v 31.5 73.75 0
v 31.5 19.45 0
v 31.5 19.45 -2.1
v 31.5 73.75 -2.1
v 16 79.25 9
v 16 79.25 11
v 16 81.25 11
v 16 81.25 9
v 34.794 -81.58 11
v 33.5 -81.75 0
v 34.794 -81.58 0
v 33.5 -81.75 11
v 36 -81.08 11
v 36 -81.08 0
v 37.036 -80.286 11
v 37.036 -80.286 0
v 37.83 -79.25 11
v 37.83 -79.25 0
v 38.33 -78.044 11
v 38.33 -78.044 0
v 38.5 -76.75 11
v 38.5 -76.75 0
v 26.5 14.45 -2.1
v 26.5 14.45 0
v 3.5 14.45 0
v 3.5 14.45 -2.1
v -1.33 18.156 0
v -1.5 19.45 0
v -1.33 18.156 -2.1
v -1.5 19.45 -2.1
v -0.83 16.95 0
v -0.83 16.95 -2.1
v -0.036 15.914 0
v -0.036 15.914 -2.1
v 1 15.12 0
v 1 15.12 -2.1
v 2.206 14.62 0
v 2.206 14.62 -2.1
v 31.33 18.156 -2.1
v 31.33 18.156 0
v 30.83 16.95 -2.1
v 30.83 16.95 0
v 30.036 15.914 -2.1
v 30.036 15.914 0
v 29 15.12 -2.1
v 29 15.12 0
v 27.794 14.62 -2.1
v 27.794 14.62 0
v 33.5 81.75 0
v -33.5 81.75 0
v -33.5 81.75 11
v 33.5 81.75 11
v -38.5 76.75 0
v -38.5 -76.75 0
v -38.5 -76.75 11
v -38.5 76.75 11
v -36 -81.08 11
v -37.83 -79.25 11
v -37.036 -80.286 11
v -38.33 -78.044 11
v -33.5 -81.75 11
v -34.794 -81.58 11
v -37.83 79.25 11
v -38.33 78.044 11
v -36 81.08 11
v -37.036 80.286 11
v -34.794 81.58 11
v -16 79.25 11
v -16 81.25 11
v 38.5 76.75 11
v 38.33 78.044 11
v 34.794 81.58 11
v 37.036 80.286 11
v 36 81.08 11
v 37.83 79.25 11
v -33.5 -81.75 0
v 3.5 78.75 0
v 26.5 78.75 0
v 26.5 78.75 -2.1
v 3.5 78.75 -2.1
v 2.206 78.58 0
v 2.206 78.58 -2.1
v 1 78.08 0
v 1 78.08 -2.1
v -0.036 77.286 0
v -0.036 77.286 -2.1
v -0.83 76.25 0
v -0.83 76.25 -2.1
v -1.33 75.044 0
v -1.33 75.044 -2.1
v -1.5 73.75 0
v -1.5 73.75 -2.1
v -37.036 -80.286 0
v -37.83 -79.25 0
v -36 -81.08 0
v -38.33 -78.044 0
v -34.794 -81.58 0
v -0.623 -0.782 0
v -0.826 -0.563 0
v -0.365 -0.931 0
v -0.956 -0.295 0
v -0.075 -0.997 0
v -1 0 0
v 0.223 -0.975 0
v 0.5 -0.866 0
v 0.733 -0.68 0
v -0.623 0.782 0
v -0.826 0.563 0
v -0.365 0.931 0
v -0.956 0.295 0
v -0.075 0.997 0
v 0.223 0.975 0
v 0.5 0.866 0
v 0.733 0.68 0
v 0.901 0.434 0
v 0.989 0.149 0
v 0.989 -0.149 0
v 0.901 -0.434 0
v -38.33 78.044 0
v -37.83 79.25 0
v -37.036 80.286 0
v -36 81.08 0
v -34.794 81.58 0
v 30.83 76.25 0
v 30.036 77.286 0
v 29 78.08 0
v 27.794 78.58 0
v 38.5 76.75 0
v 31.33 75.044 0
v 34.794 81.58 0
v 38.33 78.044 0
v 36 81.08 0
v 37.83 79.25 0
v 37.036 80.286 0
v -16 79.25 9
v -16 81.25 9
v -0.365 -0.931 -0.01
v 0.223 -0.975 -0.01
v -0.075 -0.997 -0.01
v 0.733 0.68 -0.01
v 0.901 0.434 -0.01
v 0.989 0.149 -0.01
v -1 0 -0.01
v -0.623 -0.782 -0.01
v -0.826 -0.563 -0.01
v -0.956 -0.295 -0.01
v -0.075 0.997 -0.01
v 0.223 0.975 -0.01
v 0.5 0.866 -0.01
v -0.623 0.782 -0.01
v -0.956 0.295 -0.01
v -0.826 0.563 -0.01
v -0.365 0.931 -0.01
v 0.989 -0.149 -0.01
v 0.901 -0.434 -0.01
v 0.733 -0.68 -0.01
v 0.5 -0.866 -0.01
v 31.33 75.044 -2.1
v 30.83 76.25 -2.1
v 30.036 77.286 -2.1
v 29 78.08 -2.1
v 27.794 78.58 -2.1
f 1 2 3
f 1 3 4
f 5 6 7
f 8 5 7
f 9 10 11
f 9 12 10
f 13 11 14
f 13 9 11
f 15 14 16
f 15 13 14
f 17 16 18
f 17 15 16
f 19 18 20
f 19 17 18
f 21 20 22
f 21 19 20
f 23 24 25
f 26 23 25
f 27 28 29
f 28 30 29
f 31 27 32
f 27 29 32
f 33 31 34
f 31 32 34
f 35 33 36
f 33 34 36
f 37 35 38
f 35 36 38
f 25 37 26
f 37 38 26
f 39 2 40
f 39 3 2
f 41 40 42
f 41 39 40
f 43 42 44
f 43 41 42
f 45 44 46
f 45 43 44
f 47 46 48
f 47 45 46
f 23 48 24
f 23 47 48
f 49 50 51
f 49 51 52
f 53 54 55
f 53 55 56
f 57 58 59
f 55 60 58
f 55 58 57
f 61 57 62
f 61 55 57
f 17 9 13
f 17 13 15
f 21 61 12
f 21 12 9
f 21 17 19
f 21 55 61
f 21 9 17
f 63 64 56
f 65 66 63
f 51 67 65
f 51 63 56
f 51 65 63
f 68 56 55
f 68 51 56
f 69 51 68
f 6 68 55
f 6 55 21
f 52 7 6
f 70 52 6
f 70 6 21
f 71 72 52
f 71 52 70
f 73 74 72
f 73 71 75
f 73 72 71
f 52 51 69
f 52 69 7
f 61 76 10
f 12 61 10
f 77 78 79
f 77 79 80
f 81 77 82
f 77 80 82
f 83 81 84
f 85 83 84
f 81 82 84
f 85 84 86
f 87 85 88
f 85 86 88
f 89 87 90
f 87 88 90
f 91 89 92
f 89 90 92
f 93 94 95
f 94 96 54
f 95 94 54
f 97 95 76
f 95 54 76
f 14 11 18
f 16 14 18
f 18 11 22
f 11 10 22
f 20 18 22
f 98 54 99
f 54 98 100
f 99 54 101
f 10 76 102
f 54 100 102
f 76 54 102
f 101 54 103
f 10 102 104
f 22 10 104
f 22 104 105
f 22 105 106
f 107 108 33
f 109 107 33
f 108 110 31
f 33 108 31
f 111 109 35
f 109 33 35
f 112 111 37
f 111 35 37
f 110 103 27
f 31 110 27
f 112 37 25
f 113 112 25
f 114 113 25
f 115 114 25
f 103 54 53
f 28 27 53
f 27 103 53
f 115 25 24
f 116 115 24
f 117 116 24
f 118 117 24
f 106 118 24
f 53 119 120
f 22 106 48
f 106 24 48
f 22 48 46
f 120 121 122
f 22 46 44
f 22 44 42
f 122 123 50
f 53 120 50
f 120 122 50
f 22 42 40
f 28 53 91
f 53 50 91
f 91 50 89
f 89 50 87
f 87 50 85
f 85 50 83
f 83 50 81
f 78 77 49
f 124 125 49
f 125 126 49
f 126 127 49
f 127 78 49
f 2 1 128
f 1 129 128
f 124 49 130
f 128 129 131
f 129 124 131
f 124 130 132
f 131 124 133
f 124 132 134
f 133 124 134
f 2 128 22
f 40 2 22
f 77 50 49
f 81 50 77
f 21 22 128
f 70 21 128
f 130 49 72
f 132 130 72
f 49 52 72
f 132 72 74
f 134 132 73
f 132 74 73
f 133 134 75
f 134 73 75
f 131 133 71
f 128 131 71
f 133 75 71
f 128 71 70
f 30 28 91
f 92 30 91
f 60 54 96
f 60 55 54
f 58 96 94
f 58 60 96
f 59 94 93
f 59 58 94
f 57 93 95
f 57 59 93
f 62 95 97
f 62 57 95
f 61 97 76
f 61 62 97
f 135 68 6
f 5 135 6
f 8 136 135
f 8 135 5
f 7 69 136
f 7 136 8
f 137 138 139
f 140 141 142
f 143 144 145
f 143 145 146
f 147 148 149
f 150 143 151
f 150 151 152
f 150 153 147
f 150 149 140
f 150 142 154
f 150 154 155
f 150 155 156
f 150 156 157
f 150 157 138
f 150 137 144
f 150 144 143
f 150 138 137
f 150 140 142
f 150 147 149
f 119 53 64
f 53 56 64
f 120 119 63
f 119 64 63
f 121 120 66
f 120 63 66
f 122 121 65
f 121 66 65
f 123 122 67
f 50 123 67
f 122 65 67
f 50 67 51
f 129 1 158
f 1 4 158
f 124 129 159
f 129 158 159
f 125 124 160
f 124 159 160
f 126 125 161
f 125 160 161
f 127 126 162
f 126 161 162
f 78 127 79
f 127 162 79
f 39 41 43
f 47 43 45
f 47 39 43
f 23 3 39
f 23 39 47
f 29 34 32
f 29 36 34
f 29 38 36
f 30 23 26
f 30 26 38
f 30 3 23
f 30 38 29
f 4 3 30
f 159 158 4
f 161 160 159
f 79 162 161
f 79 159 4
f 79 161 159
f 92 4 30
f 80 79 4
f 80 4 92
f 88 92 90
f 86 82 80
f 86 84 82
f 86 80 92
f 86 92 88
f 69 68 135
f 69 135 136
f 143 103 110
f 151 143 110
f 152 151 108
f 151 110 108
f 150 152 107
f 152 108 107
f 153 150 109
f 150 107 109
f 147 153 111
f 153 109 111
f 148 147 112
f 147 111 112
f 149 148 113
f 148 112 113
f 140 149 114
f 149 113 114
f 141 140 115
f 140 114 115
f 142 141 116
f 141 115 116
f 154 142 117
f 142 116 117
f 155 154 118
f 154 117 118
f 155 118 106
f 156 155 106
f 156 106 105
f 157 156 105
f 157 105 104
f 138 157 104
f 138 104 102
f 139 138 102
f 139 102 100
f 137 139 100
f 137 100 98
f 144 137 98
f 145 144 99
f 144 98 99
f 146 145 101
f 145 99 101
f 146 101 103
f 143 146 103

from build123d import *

# Parameters (mm, degrees)
SKETCH_1_W          = 77
SKETCH_1_H          = 163.5
EXTRUDE_1_DEPTH     = 11
SKETCH_2_W          = 33
SKETCH_2_H          = 64.3
EXTRUDE_2_DEPTH     = 2.1
FILLET_1_R          = 5
FILLET_2_R          = 5
SKETCH_3_W          = 32
SKETCH_3_H          = 2
CUT_EXTRUDE_1_DEPTH = 2
WRAP_1_OUTLINE_R    = 1
WRAP_1_DEPTH        = 0.01


# Read off the part's stored shape, not the designer's step: 包覆1
with BuildPart() as part:
    # 草图1 → 凸台-拉伸1 (new body)
    with BuildSketch(Plane.XY):
        Rectangle(SKETCH_1_W, SKETCH_1_H)
    extrude(amount=EXTRUDE_1_DEPTH)

    # 草图2 → 凸台-拉伸2 (add)
    with BuildSketch(Plane(origin=(0, 0, 0), x_dir=(-1, 0, 0), z_dir=(0, 0, -1))):
        with Locations((-15, 46.6)):
            Rectangle(SKETCH_2_W, SKETCH_2_H)
    extrude(amount=EXTRUDE_2_DEPTH)

    # 圆角1
    fillet_1_edges = [part.edges().sort_by_distance(p)[0] for p in [
        (31.5, 78.75, -1.05),
        (31.5, 14.45, -1.05),
        (-1.5, 14.45, -1.05),
        (-1.5, 78.75, -1.05),
    ]]
    fillet(fillet_1_edges, radius=FILLET_1_R)

    # 圆角2
    fillet_2_edges = [part.edges().sort_by_distance(p)[0] for p in [
        (38.5, -81.75, 5.5),
        (-38.5, -81.75, 5.5),
        (-38.5, 81.75, 5.5),
        (38.5, 81.75, 5.5),
    ]]
    fillet(fillet_2_edges, radius=FILLET_2_R)

    # 草图3 → 切除-拉伸1 (cut)
    with BuildSketch(Plane.XY.offset(11)):
        with Locations((0, 80.25)):
            Rectangle(SKETCH_3_W, SKETCH_3_H)
    extrude(amount=-CUT_EXTRUDE_1_DEPTH, mode=Mode.SUBTRACT)

    # 包覆1 outline → 包覆1 (add)
    with BuildSketch(Plane(origin=(0, 0, 0), x_dir=(-1, 0, 0), z_dir=(0, 0, -1))):
        Circle(WRAP_1_OUTLINE_R)
    extrude(amount=WRAP_1_DEPTH)


solid = part.part
